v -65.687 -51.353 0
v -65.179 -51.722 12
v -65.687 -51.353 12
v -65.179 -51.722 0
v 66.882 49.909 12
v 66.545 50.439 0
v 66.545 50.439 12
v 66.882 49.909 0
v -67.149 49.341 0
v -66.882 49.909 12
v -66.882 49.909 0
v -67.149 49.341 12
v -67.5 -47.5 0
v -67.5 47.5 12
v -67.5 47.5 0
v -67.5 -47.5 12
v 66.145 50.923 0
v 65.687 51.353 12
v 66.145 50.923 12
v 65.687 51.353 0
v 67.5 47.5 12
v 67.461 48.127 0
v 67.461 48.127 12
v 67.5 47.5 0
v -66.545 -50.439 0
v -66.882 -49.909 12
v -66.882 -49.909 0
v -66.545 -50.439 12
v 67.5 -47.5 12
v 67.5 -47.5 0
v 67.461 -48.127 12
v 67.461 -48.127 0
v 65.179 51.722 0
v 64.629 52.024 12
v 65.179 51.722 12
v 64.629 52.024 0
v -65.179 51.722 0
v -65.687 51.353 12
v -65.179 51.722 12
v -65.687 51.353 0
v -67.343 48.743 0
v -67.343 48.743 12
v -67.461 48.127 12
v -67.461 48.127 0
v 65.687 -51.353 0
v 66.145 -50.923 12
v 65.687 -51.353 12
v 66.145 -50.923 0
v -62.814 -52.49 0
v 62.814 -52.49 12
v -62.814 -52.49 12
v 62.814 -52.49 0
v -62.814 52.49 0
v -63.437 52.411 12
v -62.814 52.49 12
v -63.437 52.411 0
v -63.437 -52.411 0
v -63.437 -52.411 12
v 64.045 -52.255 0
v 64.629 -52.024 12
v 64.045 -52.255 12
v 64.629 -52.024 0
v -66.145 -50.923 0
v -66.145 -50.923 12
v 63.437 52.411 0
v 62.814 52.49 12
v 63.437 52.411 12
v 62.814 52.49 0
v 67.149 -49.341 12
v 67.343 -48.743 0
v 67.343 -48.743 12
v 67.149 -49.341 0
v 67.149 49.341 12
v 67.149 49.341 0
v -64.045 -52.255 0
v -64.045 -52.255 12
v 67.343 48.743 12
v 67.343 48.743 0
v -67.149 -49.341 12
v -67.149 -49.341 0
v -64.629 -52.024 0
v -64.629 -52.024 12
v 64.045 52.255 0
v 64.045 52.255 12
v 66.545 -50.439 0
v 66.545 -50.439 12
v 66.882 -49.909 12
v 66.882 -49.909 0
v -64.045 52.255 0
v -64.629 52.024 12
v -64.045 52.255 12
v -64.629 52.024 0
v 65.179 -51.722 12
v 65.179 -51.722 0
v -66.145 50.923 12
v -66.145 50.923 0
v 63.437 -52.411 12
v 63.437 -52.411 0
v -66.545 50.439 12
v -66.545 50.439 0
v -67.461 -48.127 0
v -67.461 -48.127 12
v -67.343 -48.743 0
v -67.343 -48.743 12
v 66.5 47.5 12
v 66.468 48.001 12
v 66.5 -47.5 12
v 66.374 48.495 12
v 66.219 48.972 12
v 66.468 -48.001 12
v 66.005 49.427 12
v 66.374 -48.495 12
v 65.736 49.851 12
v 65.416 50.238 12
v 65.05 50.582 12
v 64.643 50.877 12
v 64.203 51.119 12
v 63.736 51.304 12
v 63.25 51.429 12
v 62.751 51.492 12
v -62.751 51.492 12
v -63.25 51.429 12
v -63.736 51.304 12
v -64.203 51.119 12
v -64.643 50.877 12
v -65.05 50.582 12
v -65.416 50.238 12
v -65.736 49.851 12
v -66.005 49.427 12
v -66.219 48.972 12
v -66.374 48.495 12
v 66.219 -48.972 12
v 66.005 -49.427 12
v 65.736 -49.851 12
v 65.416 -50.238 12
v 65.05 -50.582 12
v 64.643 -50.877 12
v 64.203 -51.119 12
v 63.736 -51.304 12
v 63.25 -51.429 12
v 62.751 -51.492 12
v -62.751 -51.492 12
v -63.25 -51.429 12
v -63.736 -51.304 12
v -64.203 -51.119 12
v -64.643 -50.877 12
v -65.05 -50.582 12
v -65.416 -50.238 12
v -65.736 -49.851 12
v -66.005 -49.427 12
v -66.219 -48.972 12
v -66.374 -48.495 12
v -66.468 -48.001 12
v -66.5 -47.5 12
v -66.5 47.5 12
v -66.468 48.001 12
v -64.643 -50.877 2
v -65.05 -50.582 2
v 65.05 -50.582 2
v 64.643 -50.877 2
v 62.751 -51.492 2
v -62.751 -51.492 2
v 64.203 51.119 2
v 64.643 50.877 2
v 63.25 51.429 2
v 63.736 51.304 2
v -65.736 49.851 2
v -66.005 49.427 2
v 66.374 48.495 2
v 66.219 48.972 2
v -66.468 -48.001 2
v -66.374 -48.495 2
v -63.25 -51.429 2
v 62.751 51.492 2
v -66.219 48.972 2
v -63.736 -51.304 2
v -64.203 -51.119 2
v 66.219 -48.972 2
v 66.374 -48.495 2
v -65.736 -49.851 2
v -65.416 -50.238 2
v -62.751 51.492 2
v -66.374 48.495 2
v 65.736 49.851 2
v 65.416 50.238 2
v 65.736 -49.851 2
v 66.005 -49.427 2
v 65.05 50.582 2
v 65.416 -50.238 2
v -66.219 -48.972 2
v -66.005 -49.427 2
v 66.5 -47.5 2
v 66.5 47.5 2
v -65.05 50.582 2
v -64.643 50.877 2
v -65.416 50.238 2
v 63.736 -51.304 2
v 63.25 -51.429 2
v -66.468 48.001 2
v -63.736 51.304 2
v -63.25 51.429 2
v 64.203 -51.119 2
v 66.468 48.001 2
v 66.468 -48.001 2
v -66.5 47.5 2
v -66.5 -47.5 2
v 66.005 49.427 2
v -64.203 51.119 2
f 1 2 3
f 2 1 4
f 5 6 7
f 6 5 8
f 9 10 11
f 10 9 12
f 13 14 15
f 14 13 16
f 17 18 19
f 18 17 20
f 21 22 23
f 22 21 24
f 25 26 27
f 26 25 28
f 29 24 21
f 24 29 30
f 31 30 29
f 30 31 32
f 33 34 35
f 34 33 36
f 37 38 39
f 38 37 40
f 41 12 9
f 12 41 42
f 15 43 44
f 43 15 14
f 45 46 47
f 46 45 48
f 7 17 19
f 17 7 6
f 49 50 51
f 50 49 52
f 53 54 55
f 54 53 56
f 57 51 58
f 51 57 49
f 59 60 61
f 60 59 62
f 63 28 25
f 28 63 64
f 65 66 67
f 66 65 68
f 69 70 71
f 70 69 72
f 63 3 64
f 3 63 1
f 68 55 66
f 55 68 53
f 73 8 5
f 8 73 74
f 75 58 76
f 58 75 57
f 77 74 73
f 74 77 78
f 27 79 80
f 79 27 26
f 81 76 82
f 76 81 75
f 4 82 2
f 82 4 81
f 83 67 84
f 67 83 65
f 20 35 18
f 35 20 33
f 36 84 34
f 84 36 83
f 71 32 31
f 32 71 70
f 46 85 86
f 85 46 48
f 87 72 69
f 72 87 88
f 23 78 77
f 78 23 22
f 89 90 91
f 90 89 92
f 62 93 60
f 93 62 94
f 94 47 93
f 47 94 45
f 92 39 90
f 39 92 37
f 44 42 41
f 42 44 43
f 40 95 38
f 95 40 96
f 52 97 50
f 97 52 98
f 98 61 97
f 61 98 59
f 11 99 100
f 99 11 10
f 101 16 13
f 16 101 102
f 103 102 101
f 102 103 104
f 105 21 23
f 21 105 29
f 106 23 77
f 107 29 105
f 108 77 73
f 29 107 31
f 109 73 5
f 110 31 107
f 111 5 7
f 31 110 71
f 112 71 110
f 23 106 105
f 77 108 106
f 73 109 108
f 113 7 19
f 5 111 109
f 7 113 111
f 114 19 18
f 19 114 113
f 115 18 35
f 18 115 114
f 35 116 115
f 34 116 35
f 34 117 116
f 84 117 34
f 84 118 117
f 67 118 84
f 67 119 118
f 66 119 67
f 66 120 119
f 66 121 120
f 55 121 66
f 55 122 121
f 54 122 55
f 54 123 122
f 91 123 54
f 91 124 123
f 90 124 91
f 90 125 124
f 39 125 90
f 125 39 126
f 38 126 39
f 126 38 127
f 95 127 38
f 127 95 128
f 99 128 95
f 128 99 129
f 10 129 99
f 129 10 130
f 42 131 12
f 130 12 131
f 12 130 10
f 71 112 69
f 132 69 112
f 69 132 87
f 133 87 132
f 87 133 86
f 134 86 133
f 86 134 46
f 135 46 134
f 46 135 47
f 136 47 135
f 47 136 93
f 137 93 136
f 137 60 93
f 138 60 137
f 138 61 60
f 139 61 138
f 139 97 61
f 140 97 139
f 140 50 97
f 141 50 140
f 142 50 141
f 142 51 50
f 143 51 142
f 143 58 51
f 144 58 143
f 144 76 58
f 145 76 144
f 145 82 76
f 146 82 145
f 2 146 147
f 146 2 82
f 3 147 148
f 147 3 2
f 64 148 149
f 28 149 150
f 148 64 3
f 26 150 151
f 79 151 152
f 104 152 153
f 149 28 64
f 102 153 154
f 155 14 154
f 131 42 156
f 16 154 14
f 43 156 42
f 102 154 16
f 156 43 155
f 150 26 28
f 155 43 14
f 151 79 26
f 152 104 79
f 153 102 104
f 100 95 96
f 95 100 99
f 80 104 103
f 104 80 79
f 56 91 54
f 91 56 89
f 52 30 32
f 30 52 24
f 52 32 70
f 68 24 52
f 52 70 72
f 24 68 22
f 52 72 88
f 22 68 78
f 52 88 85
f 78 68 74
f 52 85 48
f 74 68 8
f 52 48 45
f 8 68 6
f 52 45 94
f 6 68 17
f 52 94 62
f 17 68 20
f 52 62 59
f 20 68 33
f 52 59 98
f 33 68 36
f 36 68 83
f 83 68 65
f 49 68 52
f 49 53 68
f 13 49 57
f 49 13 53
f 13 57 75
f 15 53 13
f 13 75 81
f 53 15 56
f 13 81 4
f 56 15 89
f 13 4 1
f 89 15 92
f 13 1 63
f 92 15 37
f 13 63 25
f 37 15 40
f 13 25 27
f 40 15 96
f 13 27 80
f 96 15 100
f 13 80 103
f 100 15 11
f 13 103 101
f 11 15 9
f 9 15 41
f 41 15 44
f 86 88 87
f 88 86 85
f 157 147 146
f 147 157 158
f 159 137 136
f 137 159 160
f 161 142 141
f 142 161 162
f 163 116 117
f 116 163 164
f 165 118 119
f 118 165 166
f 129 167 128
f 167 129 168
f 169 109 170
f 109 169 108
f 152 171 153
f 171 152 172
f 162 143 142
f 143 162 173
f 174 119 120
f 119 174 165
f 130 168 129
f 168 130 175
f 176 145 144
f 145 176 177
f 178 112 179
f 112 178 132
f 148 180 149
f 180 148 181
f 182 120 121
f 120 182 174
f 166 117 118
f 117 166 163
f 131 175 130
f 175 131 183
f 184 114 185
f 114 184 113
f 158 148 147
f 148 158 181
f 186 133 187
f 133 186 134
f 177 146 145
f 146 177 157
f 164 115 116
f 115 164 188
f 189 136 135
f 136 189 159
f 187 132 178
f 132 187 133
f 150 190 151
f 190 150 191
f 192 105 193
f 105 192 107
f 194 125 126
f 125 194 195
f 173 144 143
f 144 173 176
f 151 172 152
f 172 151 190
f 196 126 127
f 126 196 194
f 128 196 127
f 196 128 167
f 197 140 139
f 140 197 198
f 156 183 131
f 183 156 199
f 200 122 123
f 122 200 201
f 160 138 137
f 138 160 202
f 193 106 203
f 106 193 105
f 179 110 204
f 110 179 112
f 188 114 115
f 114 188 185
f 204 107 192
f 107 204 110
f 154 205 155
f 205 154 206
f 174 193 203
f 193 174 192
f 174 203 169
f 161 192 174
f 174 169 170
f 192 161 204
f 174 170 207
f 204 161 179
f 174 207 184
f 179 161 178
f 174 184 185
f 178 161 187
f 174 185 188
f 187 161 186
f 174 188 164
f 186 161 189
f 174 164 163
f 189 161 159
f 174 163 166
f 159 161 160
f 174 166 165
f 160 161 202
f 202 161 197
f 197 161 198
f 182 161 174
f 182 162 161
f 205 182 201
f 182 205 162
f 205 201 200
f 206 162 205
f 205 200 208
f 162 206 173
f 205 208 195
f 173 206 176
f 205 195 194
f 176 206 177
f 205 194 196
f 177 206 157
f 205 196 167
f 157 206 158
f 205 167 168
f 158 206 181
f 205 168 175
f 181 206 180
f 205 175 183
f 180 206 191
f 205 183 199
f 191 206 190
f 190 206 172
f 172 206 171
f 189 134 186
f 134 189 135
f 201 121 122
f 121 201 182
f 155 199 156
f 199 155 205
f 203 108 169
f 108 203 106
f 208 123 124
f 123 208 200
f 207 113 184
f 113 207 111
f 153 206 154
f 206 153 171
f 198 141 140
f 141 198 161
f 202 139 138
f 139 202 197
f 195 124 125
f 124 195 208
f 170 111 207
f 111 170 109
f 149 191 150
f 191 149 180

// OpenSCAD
$fn = 50;


difference() {
	union() {
		hull() {
			translate(v = [-62.5000000000, 47.5000000000, 0]) {
				cylinder(h = 12, r = 5);
			}
			translate(v = [62.5000000000, 47.5000000000, 0]) {
				cylinder(h = 12, r = 5);
			}
			translate(v = [-62.5000000000, -47.5000000000, 0]) {
				cylinder(h = 12, r = 5);
			}
			translate(v = [62.5000000000, -47.5000000000, 0]) {
				cylinder(h = 12, r = 5);
			}
		}
	}
	union() {
		translate(v = [0, 0, 2]) {
			hull() {
				translate(v = [-62.5000000000, 47.5000000000, 0]) {
					cylinder(h = 10, r = 4);
				}
				translate(v = [62.5000000000, 47.5000000000, 0]) {
					cylinder(h = 10, r = 4);
				}
				translate(v = [-62.5000000000, -47.5000000000, 0]) {
					cylinder(h = 10, r = 4);
				}
				translate(v = [62.5000000000, -47.5000000000, 0]) {
					cylinder(h = 10, r = 4);
				}
			}
		}
	}
}
